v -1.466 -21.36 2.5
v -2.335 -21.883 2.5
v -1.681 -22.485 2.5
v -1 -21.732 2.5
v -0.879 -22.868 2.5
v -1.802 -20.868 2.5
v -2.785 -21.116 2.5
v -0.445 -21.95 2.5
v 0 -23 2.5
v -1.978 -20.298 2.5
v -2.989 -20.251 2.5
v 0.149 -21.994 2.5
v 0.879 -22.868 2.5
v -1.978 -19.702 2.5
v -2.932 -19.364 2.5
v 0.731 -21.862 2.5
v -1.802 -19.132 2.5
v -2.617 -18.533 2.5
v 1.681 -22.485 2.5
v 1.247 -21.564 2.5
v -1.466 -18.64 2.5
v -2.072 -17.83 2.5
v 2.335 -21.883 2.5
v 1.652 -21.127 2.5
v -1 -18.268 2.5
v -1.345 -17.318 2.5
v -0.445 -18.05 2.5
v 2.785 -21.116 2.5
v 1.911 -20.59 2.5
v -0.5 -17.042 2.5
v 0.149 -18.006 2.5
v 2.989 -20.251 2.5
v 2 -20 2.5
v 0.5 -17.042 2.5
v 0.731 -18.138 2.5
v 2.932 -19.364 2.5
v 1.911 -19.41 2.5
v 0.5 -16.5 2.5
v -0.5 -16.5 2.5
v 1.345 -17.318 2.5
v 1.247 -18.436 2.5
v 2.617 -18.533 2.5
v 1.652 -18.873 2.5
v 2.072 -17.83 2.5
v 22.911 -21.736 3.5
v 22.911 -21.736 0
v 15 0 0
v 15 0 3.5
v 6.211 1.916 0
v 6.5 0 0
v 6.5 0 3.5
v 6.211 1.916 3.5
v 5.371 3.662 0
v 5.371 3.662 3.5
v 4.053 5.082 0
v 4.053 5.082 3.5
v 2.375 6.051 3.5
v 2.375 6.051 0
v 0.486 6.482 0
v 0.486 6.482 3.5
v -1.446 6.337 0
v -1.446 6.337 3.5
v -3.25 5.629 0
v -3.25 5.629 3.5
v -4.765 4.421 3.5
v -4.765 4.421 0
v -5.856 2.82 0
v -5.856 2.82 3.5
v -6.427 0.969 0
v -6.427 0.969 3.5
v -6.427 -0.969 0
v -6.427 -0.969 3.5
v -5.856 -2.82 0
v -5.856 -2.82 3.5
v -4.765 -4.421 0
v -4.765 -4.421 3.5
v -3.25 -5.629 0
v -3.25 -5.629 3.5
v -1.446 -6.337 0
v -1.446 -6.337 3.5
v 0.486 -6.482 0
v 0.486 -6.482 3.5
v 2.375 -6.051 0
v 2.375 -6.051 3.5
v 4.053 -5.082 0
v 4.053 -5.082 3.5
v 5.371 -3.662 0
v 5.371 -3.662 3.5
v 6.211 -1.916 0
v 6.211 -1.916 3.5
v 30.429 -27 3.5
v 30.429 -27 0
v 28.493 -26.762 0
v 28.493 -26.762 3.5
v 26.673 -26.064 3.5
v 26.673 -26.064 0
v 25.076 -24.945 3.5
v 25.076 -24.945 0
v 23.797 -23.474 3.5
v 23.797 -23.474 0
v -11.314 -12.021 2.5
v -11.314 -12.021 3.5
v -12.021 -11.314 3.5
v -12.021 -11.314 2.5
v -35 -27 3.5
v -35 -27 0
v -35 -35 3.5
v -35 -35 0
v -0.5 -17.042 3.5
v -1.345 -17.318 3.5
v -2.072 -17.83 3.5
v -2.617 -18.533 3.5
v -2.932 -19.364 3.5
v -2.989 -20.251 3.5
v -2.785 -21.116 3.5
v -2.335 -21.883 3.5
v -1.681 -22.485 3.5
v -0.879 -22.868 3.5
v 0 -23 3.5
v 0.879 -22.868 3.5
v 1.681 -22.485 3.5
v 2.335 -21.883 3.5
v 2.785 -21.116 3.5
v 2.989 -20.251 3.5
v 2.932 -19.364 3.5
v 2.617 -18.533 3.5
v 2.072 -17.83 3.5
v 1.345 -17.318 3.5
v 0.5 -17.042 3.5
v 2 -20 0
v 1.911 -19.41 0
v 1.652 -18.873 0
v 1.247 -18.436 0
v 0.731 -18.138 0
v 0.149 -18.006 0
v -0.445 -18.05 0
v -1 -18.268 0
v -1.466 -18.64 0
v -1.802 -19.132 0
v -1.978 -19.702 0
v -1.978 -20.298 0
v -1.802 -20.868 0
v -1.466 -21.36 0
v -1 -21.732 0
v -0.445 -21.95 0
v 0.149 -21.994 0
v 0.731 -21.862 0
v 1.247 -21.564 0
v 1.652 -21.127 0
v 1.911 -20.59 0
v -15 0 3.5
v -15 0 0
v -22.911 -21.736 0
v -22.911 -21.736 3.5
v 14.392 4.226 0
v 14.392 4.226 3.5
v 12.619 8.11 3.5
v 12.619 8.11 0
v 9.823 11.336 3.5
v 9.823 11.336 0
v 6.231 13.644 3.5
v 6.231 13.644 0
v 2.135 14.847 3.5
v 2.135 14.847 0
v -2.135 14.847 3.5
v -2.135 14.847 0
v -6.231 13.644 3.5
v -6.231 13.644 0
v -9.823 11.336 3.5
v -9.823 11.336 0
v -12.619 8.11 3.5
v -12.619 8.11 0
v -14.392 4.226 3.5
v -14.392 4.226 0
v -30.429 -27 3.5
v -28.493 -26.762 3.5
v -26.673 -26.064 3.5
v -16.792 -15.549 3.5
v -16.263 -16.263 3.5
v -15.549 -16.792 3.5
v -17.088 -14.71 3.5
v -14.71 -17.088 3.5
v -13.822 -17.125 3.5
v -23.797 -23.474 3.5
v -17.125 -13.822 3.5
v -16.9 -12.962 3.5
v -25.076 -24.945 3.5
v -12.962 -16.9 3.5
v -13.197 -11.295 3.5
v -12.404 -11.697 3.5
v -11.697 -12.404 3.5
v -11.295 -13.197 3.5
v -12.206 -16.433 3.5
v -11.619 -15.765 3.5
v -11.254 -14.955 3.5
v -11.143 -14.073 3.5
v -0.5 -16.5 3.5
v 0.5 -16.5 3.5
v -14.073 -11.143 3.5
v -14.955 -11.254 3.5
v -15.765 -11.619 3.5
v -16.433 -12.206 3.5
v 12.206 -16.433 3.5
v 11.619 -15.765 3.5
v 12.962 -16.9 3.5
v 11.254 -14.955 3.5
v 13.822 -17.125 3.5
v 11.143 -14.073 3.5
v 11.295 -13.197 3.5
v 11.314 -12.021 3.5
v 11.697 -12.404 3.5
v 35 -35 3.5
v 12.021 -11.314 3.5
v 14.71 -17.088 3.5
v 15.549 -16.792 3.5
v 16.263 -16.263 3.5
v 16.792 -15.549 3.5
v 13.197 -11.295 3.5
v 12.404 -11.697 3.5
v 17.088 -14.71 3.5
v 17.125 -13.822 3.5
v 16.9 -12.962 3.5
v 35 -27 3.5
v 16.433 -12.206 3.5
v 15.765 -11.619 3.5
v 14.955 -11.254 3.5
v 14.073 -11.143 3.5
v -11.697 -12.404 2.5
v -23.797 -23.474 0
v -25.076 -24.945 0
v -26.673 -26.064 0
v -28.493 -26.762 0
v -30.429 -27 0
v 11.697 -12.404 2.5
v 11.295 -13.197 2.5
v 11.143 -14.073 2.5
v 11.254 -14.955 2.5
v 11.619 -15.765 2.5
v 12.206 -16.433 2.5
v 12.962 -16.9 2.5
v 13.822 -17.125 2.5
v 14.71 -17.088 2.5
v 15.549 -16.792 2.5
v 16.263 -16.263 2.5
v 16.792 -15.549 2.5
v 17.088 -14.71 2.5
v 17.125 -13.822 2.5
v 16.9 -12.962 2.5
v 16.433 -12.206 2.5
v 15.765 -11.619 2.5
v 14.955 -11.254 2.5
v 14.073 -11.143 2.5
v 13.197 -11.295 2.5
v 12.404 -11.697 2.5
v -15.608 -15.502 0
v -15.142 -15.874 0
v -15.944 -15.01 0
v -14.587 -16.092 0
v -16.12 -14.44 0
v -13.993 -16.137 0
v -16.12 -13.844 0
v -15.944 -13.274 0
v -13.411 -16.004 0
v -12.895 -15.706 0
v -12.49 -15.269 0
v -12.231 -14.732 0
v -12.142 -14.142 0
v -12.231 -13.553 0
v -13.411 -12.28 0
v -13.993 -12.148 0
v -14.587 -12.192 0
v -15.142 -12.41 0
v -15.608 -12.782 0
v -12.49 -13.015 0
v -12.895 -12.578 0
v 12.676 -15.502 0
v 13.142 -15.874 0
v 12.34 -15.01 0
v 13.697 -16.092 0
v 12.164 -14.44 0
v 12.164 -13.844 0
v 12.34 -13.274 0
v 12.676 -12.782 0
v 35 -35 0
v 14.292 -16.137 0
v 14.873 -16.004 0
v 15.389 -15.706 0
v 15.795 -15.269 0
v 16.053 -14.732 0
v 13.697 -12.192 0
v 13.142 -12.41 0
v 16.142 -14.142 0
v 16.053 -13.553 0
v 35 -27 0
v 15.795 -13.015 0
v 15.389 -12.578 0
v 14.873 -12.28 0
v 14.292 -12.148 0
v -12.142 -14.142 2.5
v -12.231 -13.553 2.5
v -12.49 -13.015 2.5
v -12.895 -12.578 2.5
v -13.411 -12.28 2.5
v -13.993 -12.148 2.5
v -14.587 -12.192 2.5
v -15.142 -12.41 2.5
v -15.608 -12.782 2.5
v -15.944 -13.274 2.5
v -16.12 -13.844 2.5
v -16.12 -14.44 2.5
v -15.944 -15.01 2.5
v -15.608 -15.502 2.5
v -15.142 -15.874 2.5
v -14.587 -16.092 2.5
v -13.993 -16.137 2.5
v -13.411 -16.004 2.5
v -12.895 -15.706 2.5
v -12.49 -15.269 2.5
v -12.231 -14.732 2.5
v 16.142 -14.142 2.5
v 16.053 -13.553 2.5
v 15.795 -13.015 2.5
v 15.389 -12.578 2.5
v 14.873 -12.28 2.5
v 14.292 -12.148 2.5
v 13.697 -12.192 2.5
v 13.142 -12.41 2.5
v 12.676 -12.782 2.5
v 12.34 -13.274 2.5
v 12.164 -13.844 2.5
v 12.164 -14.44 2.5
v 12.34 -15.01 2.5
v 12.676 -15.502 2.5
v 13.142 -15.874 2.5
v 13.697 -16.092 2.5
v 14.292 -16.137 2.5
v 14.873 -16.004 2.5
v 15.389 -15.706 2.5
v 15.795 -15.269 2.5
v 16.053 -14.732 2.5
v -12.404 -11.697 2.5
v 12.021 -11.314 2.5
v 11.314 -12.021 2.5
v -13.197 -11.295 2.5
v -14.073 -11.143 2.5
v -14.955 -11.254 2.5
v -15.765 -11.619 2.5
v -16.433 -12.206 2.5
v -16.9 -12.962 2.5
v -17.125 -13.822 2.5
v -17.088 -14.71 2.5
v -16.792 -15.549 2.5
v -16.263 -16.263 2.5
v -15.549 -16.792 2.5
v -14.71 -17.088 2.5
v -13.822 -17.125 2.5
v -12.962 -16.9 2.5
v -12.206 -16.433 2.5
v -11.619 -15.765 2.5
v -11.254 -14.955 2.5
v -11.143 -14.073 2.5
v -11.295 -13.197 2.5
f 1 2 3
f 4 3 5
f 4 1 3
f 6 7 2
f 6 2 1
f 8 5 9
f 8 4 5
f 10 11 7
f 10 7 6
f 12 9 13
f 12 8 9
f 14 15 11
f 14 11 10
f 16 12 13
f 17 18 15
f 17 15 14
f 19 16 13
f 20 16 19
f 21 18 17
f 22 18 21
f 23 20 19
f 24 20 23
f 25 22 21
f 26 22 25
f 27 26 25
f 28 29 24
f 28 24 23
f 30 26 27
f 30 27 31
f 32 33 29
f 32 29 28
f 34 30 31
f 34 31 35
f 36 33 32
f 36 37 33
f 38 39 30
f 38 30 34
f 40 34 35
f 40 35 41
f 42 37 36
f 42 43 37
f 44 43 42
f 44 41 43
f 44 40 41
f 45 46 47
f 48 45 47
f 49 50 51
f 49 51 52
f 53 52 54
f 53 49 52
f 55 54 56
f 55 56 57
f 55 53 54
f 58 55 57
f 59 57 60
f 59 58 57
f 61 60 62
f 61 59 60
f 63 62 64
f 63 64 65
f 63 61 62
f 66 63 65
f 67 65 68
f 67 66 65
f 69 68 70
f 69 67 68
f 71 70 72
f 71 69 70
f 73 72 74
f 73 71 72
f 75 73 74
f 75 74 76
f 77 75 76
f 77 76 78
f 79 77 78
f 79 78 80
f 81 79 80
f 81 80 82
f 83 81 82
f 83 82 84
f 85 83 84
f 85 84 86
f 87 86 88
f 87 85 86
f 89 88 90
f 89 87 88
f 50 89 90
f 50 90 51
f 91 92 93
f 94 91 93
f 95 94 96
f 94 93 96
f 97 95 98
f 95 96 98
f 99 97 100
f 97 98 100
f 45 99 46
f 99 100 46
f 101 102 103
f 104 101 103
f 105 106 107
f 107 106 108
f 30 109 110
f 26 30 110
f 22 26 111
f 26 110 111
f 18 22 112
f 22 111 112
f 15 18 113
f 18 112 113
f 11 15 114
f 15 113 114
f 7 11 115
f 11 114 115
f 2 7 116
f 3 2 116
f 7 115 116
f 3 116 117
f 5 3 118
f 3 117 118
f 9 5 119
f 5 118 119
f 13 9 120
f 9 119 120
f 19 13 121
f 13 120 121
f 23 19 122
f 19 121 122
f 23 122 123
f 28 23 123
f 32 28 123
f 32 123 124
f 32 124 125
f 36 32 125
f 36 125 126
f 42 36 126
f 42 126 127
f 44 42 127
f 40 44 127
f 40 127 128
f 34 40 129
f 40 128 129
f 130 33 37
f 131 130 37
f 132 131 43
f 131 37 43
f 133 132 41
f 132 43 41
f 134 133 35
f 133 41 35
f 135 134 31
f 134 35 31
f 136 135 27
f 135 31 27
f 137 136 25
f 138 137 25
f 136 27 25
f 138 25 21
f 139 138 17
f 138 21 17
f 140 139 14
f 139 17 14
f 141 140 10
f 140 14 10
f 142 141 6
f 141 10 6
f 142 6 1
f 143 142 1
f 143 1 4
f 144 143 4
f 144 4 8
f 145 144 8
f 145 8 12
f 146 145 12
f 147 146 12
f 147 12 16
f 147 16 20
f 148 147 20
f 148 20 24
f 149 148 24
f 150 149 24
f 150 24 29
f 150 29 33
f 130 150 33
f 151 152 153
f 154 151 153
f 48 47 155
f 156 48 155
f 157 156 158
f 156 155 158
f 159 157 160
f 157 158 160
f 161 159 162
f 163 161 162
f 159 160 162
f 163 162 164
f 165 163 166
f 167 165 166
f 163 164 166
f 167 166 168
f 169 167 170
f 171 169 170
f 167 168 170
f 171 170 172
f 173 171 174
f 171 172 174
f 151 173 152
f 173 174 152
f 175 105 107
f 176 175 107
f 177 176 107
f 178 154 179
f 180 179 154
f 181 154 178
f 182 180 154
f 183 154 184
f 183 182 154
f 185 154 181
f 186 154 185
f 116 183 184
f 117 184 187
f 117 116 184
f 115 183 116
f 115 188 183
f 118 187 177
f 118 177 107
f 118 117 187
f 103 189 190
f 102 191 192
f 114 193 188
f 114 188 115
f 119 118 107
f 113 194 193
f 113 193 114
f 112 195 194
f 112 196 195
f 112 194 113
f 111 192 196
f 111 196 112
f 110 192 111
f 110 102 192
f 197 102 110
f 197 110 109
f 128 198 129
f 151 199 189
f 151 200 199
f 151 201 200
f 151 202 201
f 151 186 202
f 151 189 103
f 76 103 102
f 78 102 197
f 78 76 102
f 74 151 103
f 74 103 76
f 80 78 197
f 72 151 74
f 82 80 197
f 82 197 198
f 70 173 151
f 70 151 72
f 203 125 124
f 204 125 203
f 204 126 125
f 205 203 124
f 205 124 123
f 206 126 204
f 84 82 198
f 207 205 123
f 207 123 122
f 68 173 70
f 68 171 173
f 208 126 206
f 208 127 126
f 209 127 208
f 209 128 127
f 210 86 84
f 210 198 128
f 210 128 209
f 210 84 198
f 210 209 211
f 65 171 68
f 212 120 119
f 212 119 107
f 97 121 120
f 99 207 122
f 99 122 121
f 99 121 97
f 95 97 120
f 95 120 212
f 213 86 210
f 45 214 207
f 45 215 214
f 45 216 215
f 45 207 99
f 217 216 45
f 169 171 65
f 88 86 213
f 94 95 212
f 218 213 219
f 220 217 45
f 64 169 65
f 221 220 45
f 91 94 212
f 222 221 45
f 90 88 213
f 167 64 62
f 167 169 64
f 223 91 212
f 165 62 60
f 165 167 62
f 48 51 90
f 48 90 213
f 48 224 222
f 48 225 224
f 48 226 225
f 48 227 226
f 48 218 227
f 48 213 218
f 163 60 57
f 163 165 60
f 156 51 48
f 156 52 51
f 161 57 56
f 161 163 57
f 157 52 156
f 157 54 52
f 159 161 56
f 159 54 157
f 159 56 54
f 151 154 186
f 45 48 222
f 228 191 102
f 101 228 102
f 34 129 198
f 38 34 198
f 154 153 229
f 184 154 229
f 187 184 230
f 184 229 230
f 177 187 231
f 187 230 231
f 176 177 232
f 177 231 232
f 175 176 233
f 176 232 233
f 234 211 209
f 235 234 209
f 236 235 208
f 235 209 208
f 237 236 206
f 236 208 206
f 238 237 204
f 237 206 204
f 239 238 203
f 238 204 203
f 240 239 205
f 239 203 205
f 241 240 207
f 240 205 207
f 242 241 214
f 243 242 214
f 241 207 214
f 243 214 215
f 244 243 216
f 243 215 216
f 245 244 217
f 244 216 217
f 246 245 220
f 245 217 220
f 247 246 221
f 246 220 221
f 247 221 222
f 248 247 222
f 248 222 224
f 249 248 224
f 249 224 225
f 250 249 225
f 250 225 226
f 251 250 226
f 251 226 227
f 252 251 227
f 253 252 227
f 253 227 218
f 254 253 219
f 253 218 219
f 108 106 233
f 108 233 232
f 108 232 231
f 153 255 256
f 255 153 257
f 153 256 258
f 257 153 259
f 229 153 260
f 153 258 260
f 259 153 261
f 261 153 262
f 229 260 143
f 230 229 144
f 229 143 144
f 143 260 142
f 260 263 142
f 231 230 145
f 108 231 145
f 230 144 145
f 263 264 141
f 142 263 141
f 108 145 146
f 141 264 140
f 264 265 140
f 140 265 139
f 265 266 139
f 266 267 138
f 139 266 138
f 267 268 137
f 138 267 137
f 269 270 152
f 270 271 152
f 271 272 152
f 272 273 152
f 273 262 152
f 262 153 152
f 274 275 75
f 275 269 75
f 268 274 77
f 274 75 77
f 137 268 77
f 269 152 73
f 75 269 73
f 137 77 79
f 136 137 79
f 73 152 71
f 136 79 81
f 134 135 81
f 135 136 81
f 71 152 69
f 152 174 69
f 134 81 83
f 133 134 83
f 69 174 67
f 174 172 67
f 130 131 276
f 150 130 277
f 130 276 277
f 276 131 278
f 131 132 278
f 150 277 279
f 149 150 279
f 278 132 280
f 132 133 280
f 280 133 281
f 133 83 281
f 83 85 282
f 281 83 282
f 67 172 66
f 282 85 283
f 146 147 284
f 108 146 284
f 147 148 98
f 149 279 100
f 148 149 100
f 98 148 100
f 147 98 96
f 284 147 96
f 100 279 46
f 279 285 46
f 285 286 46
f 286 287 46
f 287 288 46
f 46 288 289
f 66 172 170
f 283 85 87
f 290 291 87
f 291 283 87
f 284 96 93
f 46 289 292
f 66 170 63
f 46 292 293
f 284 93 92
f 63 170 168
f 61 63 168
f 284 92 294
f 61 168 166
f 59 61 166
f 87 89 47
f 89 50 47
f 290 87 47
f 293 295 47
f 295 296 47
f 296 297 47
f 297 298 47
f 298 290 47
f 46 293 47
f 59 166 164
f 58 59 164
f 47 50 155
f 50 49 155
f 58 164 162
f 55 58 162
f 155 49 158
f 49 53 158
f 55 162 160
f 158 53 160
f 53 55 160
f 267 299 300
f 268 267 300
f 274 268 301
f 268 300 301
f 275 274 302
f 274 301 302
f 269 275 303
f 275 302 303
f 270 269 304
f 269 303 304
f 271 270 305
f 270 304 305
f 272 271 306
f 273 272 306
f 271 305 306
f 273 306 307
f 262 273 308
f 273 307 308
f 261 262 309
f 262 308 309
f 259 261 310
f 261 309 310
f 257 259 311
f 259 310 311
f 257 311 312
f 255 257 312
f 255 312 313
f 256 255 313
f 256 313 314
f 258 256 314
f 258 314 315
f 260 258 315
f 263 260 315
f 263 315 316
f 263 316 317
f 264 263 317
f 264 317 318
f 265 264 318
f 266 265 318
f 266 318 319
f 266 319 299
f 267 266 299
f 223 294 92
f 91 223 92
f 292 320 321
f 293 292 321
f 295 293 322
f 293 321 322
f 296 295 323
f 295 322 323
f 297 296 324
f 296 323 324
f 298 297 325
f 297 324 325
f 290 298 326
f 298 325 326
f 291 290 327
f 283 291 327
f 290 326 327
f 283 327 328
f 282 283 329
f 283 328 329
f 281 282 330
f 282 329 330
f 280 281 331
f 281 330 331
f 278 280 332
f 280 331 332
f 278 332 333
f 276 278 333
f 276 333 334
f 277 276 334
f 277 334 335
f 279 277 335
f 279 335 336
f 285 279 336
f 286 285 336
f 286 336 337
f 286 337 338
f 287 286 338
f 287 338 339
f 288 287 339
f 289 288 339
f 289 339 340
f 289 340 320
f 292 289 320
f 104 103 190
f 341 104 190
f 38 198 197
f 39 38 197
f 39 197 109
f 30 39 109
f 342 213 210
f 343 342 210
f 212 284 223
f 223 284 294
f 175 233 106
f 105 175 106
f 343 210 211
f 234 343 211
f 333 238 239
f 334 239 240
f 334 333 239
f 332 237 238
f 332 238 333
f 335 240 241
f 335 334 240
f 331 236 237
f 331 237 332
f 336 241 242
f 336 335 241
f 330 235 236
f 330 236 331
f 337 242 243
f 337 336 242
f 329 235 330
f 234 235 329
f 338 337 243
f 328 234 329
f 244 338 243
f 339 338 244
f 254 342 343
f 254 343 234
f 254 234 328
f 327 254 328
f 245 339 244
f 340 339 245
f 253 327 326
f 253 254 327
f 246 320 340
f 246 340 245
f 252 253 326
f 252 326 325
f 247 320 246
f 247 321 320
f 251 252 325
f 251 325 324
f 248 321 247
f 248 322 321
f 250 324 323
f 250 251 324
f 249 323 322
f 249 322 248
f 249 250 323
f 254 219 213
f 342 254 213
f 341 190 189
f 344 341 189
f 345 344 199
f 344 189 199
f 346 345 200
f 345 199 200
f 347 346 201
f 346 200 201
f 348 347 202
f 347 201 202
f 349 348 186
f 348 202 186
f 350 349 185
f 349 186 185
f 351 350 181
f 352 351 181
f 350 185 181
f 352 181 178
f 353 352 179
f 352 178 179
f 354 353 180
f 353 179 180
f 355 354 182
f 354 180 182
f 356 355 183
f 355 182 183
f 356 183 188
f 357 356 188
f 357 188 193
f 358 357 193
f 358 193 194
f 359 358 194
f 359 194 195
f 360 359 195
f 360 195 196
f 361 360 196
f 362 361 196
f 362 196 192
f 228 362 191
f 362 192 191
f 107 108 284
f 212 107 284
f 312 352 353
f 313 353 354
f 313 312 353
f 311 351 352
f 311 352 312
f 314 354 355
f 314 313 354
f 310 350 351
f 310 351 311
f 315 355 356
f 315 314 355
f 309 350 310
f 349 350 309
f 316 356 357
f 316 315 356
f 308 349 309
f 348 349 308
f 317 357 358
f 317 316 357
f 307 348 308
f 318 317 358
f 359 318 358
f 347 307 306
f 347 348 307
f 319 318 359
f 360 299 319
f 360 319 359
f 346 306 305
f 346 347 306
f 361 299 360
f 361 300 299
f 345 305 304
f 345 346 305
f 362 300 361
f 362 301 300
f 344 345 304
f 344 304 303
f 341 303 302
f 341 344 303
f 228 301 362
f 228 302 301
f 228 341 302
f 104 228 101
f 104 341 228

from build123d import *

# Parameters (mm, degrees)
SKETCH1_R           = 6.5
BOSS_EXTRUDE1_DEPTH = 3.5
SKETCH2_R           = 2
CUT_EXTRUDE1_DEPTH  = 10
CUT_EXTRUDE2_START  = -3.5
CUT_EXTRUDE2_DEPTH  = 1


with BuildPart() as part:
    # Sketch1 → Boss-Extrude1 (new body)
    with BuildSketch(Plane.XY):
        with BuildLine():
            Line((-15, 0), (-22.911315665, -21.736161147))
            ThreePointArc((-22.911315665, -21.736161147), (-25.84024514, -25.553216354), (-30.428856631, -27))
            Line((-30.428856631, -27), (-35, -27))
            Line((-35, -27), (-35, -35))
            Line((-35, -35), (35, -35))
            Line((35, -35), (35, -27))
            Line((35, -27), (30.428856631, -27))
            ThreePointArc((30.428856631, -27), (25.84024514, -25.553216354), (22.911315665, -21.736161147))
            Line((22.911315665, -21.736161147), (15, 0))
            ThreePointArc((15, 0), (0, 15), (-15, 0))
        make_face()
        Circle(SKETCH1_R, mode=Mode.SUBTRACT)
    extrude(amount=BOSS_EXTRUDE1_DEPTH)

    # Sketch2 → Cut-Extrude1 (cut)
    with BuildSketch(Plane.XY.offset(3.5)):
        with Locations((-14.142135624, -14.142135624)):
            Circle(SKETCH2_R)
        with Locations((0, -20)):
            Circle(SKETCH2_R)
        with Locations((14.142135624, -14.142135624)):
            Circle(SKETCH2_R)
    extrude(amount=-CUT_EXTRUDE1_DEPTH, mode=Mode.SUBTRACT)

    # Sketch3 → Cut-Extrude2 (cut)
    with BuildSketch(Plane(origin=(0, 0, 0), x_dir=(-1, 0, 0), z_dir=(0, 0, -1)).offset(CUT_EXTRUDE2_START)):
        with BuildLine():
            Line((-12.404038948, -11.696932167), (-12.02081528, -11.313708499))
            Line((-12.02081528, -11.313708499), (-11.313708499, -12.02081528))
            Line((-11.313708499, -12.02081528), (-11.696932167, -12.404038948))
            ThreePointArc((-11.696932167, -12.404038948), (-16.263455967, -16.263455967), (-12.404038948, -11.696932167))
        make_face()
        with BuildLine():
            Line((-0.5, -17.041960108), (-0.5, -16.5))
            Line((-0.5, -16.5), (0.5, -16.5))
            Line((0.5, -16.5), (0.5, -17.041960108))
            ThreePointArc((0.5, -17.041960108), (0, -23), (-0.5, -17.041960108))
        make_face()
        with BuildLine():
            Line((11.696932167, -12.404038948), (11.313708499, -12.02081528))
            Line((11.313708499, -12.02081528), (12.02081528, -11.313708499))
            Line((12.02081528, -11.313708499), (12.404038948, -11.696932167))
            ThreePointArc((12.404038948, -11.696932167), (16.263455967, -16.263455967), (11.696932167, -12.404038948))
        make_face()
    extrude(amount=CUT_EXTRUDE2_DEPTH, mode=Mode.SUBTRACT)


solid = part.part
